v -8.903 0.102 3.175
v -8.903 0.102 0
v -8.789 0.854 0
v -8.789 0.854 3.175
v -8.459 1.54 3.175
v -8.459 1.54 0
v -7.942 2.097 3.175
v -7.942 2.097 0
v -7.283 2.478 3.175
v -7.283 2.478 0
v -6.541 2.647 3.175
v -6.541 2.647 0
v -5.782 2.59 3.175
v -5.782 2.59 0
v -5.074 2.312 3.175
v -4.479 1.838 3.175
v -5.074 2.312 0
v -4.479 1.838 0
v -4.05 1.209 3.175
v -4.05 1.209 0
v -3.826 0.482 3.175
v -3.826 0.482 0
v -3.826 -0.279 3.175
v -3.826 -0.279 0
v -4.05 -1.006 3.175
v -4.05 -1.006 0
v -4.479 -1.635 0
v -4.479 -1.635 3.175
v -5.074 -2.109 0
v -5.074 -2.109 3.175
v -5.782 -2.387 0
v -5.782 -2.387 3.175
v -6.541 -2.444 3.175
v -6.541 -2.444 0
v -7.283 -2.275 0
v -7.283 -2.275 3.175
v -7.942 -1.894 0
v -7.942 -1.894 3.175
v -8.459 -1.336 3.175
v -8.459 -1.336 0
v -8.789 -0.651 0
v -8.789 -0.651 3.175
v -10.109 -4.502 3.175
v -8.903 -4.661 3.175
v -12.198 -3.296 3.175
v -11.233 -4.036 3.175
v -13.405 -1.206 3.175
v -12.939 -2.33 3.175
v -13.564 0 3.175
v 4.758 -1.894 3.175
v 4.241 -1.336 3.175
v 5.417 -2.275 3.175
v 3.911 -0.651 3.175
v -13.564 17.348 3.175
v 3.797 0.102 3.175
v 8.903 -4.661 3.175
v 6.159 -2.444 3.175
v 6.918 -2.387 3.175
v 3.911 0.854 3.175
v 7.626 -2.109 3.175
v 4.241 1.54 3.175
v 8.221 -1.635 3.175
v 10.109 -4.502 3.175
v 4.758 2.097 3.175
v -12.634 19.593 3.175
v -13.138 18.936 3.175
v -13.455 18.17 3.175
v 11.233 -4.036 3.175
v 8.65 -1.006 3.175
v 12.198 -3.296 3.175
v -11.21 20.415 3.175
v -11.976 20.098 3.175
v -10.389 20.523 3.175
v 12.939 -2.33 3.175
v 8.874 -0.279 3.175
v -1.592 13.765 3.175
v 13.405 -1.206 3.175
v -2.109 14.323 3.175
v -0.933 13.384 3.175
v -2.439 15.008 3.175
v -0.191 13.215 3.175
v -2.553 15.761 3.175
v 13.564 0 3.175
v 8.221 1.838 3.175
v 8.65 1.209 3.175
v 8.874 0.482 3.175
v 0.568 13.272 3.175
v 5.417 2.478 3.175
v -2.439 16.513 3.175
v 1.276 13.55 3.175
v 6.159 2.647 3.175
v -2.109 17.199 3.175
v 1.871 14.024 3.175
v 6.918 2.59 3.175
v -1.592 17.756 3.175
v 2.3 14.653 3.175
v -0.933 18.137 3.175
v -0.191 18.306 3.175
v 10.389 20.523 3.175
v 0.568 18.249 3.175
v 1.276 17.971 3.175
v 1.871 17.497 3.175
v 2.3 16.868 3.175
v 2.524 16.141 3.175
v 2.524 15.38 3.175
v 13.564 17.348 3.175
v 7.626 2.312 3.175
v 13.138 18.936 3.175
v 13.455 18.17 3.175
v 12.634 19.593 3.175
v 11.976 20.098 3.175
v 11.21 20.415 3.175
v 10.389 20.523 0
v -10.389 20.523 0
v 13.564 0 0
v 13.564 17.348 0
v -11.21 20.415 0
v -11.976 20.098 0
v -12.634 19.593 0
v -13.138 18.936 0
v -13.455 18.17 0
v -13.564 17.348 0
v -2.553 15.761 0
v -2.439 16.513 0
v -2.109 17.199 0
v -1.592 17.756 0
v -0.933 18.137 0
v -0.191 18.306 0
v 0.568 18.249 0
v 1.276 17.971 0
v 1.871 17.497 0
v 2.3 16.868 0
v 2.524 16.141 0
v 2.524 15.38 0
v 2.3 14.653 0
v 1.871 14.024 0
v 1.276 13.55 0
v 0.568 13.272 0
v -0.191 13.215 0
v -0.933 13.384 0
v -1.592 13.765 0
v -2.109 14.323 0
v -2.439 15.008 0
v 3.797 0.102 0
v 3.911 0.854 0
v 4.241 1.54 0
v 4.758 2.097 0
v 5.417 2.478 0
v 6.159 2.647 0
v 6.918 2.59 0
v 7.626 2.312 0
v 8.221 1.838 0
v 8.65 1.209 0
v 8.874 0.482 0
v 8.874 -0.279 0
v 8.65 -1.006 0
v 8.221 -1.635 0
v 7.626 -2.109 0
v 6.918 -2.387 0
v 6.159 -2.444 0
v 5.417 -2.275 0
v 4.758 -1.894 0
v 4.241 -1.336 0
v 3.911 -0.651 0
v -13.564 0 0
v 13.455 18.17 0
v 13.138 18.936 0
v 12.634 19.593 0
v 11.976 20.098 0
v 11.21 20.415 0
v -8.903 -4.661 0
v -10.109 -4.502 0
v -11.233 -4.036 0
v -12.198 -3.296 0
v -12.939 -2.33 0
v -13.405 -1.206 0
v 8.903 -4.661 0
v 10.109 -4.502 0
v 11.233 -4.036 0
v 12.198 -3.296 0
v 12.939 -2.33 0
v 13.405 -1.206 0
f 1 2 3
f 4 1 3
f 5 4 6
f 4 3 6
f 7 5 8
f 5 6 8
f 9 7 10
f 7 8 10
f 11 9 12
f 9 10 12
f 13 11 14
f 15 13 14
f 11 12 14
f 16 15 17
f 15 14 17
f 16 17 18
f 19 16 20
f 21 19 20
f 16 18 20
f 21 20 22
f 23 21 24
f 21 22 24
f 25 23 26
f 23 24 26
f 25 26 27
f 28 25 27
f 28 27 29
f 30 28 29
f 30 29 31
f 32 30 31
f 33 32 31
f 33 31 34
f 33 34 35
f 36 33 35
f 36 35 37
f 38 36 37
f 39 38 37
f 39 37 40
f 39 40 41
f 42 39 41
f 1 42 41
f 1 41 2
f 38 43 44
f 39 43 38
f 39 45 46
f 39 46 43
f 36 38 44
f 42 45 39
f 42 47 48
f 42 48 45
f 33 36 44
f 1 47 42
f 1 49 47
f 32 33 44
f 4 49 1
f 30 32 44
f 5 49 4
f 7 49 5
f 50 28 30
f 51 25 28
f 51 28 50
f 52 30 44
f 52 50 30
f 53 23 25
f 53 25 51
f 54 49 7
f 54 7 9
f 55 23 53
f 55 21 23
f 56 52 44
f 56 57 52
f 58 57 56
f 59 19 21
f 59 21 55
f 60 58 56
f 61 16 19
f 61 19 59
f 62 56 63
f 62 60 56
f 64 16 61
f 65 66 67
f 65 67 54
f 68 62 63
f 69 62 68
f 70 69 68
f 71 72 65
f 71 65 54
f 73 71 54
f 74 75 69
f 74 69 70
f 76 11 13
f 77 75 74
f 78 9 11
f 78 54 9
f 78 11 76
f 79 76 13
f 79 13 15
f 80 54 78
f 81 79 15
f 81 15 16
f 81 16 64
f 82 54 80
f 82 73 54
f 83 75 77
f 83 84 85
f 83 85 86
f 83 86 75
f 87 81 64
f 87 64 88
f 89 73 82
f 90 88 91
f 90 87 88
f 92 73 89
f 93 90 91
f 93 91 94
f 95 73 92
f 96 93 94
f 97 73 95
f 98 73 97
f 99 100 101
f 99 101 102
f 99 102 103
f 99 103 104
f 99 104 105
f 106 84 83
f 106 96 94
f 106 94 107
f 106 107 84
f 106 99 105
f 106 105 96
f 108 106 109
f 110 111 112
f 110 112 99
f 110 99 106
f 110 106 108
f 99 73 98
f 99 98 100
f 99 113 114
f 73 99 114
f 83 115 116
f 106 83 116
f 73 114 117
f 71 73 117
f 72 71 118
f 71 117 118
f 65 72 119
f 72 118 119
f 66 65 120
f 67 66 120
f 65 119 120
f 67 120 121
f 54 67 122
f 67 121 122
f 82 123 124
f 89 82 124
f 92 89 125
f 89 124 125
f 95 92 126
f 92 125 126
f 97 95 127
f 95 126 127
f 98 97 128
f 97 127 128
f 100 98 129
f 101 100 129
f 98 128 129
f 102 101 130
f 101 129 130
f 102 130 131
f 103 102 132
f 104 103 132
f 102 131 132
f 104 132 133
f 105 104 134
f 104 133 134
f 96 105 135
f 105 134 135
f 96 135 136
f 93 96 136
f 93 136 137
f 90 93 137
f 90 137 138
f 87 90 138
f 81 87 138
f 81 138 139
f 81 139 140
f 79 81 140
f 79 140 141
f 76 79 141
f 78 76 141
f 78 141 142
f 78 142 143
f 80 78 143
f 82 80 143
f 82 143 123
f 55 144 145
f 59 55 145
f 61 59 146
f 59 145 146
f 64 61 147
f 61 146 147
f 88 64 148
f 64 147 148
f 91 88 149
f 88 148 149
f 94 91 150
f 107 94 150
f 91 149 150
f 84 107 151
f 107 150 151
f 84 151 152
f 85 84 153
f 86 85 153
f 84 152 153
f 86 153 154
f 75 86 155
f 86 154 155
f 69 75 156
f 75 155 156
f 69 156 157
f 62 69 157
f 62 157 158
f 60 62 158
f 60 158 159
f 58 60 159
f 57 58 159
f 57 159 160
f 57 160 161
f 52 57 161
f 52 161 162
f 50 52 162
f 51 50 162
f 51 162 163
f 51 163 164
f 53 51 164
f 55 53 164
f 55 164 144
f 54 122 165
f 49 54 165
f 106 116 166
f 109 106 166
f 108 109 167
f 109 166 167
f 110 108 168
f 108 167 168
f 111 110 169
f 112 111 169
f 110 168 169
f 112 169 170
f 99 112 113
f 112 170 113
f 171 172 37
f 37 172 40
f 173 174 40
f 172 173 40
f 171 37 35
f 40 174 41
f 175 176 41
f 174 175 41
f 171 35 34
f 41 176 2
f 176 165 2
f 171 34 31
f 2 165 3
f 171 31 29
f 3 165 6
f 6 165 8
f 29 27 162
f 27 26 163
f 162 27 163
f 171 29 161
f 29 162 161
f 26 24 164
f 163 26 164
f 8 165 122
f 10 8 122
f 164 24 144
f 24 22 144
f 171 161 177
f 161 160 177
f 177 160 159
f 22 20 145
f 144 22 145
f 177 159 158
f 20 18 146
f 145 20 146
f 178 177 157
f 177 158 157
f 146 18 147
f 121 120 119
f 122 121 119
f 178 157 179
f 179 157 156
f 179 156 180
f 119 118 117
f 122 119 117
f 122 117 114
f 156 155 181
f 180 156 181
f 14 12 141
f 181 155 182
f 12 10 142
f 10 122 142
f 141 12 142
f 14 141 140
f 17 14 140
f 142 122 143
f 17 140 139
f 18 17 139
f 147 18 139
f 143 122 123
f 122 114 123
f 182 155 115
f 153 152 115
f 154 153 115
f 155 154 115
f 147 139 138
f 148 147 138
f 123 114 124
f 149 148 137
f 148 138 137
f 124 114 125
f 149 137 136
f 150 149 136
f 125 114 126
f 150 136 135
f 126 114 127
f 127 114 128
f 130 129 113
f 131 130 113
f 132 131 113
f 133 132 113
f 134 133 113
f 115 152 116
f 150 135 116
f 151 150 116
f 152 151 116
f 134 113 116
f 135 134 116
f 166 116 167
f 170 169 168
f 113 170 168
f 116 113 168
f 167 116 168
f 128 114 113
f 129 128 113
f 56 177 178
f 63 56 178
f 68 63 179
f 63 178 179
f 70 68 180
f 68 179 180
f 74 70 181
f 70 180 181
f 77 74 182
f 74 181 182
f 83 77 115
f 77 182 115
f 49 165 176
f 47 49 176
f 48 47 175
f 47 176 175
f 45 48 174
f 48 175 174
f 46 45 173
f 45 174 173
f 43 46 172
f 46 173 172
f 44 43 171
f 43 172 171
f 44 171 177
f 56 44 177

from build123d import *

# Parameters (mm, degrees)
BOSS_EXTRUDE1_DEPTH    = 3.175
F_10_CLEARANCE_HOLE1_D = 5.1054


with BuildPart() as part:
    # Sketch1 → Boss-Extrude1 (new body)
    with BuildSketch(Plane.XY):
        with BuildLine():
            Line((-8.9027, 4.6609), (8.9027, 4.6609))
            ThreePointArc((8.9027, 4.6609), (12.198453996, 3.295753996), (13.5636, 0))
            Line((13.5636, 0), (13.5636, 17.3482))
            ThreePointArc((13.5636, 17.3482), (12.63366403, 19.59326403), (10.3886, 20.5232))
            Line((10.3886, 20.5232), (-10.3886, 20.5232))
            ThreePointArc((-10.3886, 20.5232), (-12.63366403, 19.59326403), (-13.5636, 17.3482))
            Line((-13.5636, 17.3482), (-13.5636, 0))
            ThreePointArc((-13.5636, 0), (-12.198453996, 3.295753996), (-8.9027, 4.6609))
        make_face()
        with BuildLine():
            ThreePointArc((13.5636, 0), (12.198453996, 3.295753996), (8.9027, 4.6609))
            Line((8.9027, 4.6609), (-8.9027, 4.6609))
            ThreePointArc((-8.9027, 4.6609), (-12.198453996, 3.295753996), (-13.5636, 0))
            ThreePointArc((-13.5636, 0), (-12.198453996, -3.295753996), (-8.9027, -4.6609))
            Line((-8.9027, -4.6609), (8.9027, -4.6609))
            ThreePointArc((8.9027, -4.6609), (12.198453996, -3.295753996), (13.5636, 0))
        make_face()
    extrude(amount=BOSS_EXTRUDE1_DEPTH)

    # #10 Clearance Hole1 (through all)
    with Locations(Plane.XY.offset(3.175)):
        with Locations((6.35, 0.1016), (-6.35, 0.1016), (0, 15.7607)):
            Hole(F_10_CLEARANCE_HOLE1_D / 2)


solid = part.part
